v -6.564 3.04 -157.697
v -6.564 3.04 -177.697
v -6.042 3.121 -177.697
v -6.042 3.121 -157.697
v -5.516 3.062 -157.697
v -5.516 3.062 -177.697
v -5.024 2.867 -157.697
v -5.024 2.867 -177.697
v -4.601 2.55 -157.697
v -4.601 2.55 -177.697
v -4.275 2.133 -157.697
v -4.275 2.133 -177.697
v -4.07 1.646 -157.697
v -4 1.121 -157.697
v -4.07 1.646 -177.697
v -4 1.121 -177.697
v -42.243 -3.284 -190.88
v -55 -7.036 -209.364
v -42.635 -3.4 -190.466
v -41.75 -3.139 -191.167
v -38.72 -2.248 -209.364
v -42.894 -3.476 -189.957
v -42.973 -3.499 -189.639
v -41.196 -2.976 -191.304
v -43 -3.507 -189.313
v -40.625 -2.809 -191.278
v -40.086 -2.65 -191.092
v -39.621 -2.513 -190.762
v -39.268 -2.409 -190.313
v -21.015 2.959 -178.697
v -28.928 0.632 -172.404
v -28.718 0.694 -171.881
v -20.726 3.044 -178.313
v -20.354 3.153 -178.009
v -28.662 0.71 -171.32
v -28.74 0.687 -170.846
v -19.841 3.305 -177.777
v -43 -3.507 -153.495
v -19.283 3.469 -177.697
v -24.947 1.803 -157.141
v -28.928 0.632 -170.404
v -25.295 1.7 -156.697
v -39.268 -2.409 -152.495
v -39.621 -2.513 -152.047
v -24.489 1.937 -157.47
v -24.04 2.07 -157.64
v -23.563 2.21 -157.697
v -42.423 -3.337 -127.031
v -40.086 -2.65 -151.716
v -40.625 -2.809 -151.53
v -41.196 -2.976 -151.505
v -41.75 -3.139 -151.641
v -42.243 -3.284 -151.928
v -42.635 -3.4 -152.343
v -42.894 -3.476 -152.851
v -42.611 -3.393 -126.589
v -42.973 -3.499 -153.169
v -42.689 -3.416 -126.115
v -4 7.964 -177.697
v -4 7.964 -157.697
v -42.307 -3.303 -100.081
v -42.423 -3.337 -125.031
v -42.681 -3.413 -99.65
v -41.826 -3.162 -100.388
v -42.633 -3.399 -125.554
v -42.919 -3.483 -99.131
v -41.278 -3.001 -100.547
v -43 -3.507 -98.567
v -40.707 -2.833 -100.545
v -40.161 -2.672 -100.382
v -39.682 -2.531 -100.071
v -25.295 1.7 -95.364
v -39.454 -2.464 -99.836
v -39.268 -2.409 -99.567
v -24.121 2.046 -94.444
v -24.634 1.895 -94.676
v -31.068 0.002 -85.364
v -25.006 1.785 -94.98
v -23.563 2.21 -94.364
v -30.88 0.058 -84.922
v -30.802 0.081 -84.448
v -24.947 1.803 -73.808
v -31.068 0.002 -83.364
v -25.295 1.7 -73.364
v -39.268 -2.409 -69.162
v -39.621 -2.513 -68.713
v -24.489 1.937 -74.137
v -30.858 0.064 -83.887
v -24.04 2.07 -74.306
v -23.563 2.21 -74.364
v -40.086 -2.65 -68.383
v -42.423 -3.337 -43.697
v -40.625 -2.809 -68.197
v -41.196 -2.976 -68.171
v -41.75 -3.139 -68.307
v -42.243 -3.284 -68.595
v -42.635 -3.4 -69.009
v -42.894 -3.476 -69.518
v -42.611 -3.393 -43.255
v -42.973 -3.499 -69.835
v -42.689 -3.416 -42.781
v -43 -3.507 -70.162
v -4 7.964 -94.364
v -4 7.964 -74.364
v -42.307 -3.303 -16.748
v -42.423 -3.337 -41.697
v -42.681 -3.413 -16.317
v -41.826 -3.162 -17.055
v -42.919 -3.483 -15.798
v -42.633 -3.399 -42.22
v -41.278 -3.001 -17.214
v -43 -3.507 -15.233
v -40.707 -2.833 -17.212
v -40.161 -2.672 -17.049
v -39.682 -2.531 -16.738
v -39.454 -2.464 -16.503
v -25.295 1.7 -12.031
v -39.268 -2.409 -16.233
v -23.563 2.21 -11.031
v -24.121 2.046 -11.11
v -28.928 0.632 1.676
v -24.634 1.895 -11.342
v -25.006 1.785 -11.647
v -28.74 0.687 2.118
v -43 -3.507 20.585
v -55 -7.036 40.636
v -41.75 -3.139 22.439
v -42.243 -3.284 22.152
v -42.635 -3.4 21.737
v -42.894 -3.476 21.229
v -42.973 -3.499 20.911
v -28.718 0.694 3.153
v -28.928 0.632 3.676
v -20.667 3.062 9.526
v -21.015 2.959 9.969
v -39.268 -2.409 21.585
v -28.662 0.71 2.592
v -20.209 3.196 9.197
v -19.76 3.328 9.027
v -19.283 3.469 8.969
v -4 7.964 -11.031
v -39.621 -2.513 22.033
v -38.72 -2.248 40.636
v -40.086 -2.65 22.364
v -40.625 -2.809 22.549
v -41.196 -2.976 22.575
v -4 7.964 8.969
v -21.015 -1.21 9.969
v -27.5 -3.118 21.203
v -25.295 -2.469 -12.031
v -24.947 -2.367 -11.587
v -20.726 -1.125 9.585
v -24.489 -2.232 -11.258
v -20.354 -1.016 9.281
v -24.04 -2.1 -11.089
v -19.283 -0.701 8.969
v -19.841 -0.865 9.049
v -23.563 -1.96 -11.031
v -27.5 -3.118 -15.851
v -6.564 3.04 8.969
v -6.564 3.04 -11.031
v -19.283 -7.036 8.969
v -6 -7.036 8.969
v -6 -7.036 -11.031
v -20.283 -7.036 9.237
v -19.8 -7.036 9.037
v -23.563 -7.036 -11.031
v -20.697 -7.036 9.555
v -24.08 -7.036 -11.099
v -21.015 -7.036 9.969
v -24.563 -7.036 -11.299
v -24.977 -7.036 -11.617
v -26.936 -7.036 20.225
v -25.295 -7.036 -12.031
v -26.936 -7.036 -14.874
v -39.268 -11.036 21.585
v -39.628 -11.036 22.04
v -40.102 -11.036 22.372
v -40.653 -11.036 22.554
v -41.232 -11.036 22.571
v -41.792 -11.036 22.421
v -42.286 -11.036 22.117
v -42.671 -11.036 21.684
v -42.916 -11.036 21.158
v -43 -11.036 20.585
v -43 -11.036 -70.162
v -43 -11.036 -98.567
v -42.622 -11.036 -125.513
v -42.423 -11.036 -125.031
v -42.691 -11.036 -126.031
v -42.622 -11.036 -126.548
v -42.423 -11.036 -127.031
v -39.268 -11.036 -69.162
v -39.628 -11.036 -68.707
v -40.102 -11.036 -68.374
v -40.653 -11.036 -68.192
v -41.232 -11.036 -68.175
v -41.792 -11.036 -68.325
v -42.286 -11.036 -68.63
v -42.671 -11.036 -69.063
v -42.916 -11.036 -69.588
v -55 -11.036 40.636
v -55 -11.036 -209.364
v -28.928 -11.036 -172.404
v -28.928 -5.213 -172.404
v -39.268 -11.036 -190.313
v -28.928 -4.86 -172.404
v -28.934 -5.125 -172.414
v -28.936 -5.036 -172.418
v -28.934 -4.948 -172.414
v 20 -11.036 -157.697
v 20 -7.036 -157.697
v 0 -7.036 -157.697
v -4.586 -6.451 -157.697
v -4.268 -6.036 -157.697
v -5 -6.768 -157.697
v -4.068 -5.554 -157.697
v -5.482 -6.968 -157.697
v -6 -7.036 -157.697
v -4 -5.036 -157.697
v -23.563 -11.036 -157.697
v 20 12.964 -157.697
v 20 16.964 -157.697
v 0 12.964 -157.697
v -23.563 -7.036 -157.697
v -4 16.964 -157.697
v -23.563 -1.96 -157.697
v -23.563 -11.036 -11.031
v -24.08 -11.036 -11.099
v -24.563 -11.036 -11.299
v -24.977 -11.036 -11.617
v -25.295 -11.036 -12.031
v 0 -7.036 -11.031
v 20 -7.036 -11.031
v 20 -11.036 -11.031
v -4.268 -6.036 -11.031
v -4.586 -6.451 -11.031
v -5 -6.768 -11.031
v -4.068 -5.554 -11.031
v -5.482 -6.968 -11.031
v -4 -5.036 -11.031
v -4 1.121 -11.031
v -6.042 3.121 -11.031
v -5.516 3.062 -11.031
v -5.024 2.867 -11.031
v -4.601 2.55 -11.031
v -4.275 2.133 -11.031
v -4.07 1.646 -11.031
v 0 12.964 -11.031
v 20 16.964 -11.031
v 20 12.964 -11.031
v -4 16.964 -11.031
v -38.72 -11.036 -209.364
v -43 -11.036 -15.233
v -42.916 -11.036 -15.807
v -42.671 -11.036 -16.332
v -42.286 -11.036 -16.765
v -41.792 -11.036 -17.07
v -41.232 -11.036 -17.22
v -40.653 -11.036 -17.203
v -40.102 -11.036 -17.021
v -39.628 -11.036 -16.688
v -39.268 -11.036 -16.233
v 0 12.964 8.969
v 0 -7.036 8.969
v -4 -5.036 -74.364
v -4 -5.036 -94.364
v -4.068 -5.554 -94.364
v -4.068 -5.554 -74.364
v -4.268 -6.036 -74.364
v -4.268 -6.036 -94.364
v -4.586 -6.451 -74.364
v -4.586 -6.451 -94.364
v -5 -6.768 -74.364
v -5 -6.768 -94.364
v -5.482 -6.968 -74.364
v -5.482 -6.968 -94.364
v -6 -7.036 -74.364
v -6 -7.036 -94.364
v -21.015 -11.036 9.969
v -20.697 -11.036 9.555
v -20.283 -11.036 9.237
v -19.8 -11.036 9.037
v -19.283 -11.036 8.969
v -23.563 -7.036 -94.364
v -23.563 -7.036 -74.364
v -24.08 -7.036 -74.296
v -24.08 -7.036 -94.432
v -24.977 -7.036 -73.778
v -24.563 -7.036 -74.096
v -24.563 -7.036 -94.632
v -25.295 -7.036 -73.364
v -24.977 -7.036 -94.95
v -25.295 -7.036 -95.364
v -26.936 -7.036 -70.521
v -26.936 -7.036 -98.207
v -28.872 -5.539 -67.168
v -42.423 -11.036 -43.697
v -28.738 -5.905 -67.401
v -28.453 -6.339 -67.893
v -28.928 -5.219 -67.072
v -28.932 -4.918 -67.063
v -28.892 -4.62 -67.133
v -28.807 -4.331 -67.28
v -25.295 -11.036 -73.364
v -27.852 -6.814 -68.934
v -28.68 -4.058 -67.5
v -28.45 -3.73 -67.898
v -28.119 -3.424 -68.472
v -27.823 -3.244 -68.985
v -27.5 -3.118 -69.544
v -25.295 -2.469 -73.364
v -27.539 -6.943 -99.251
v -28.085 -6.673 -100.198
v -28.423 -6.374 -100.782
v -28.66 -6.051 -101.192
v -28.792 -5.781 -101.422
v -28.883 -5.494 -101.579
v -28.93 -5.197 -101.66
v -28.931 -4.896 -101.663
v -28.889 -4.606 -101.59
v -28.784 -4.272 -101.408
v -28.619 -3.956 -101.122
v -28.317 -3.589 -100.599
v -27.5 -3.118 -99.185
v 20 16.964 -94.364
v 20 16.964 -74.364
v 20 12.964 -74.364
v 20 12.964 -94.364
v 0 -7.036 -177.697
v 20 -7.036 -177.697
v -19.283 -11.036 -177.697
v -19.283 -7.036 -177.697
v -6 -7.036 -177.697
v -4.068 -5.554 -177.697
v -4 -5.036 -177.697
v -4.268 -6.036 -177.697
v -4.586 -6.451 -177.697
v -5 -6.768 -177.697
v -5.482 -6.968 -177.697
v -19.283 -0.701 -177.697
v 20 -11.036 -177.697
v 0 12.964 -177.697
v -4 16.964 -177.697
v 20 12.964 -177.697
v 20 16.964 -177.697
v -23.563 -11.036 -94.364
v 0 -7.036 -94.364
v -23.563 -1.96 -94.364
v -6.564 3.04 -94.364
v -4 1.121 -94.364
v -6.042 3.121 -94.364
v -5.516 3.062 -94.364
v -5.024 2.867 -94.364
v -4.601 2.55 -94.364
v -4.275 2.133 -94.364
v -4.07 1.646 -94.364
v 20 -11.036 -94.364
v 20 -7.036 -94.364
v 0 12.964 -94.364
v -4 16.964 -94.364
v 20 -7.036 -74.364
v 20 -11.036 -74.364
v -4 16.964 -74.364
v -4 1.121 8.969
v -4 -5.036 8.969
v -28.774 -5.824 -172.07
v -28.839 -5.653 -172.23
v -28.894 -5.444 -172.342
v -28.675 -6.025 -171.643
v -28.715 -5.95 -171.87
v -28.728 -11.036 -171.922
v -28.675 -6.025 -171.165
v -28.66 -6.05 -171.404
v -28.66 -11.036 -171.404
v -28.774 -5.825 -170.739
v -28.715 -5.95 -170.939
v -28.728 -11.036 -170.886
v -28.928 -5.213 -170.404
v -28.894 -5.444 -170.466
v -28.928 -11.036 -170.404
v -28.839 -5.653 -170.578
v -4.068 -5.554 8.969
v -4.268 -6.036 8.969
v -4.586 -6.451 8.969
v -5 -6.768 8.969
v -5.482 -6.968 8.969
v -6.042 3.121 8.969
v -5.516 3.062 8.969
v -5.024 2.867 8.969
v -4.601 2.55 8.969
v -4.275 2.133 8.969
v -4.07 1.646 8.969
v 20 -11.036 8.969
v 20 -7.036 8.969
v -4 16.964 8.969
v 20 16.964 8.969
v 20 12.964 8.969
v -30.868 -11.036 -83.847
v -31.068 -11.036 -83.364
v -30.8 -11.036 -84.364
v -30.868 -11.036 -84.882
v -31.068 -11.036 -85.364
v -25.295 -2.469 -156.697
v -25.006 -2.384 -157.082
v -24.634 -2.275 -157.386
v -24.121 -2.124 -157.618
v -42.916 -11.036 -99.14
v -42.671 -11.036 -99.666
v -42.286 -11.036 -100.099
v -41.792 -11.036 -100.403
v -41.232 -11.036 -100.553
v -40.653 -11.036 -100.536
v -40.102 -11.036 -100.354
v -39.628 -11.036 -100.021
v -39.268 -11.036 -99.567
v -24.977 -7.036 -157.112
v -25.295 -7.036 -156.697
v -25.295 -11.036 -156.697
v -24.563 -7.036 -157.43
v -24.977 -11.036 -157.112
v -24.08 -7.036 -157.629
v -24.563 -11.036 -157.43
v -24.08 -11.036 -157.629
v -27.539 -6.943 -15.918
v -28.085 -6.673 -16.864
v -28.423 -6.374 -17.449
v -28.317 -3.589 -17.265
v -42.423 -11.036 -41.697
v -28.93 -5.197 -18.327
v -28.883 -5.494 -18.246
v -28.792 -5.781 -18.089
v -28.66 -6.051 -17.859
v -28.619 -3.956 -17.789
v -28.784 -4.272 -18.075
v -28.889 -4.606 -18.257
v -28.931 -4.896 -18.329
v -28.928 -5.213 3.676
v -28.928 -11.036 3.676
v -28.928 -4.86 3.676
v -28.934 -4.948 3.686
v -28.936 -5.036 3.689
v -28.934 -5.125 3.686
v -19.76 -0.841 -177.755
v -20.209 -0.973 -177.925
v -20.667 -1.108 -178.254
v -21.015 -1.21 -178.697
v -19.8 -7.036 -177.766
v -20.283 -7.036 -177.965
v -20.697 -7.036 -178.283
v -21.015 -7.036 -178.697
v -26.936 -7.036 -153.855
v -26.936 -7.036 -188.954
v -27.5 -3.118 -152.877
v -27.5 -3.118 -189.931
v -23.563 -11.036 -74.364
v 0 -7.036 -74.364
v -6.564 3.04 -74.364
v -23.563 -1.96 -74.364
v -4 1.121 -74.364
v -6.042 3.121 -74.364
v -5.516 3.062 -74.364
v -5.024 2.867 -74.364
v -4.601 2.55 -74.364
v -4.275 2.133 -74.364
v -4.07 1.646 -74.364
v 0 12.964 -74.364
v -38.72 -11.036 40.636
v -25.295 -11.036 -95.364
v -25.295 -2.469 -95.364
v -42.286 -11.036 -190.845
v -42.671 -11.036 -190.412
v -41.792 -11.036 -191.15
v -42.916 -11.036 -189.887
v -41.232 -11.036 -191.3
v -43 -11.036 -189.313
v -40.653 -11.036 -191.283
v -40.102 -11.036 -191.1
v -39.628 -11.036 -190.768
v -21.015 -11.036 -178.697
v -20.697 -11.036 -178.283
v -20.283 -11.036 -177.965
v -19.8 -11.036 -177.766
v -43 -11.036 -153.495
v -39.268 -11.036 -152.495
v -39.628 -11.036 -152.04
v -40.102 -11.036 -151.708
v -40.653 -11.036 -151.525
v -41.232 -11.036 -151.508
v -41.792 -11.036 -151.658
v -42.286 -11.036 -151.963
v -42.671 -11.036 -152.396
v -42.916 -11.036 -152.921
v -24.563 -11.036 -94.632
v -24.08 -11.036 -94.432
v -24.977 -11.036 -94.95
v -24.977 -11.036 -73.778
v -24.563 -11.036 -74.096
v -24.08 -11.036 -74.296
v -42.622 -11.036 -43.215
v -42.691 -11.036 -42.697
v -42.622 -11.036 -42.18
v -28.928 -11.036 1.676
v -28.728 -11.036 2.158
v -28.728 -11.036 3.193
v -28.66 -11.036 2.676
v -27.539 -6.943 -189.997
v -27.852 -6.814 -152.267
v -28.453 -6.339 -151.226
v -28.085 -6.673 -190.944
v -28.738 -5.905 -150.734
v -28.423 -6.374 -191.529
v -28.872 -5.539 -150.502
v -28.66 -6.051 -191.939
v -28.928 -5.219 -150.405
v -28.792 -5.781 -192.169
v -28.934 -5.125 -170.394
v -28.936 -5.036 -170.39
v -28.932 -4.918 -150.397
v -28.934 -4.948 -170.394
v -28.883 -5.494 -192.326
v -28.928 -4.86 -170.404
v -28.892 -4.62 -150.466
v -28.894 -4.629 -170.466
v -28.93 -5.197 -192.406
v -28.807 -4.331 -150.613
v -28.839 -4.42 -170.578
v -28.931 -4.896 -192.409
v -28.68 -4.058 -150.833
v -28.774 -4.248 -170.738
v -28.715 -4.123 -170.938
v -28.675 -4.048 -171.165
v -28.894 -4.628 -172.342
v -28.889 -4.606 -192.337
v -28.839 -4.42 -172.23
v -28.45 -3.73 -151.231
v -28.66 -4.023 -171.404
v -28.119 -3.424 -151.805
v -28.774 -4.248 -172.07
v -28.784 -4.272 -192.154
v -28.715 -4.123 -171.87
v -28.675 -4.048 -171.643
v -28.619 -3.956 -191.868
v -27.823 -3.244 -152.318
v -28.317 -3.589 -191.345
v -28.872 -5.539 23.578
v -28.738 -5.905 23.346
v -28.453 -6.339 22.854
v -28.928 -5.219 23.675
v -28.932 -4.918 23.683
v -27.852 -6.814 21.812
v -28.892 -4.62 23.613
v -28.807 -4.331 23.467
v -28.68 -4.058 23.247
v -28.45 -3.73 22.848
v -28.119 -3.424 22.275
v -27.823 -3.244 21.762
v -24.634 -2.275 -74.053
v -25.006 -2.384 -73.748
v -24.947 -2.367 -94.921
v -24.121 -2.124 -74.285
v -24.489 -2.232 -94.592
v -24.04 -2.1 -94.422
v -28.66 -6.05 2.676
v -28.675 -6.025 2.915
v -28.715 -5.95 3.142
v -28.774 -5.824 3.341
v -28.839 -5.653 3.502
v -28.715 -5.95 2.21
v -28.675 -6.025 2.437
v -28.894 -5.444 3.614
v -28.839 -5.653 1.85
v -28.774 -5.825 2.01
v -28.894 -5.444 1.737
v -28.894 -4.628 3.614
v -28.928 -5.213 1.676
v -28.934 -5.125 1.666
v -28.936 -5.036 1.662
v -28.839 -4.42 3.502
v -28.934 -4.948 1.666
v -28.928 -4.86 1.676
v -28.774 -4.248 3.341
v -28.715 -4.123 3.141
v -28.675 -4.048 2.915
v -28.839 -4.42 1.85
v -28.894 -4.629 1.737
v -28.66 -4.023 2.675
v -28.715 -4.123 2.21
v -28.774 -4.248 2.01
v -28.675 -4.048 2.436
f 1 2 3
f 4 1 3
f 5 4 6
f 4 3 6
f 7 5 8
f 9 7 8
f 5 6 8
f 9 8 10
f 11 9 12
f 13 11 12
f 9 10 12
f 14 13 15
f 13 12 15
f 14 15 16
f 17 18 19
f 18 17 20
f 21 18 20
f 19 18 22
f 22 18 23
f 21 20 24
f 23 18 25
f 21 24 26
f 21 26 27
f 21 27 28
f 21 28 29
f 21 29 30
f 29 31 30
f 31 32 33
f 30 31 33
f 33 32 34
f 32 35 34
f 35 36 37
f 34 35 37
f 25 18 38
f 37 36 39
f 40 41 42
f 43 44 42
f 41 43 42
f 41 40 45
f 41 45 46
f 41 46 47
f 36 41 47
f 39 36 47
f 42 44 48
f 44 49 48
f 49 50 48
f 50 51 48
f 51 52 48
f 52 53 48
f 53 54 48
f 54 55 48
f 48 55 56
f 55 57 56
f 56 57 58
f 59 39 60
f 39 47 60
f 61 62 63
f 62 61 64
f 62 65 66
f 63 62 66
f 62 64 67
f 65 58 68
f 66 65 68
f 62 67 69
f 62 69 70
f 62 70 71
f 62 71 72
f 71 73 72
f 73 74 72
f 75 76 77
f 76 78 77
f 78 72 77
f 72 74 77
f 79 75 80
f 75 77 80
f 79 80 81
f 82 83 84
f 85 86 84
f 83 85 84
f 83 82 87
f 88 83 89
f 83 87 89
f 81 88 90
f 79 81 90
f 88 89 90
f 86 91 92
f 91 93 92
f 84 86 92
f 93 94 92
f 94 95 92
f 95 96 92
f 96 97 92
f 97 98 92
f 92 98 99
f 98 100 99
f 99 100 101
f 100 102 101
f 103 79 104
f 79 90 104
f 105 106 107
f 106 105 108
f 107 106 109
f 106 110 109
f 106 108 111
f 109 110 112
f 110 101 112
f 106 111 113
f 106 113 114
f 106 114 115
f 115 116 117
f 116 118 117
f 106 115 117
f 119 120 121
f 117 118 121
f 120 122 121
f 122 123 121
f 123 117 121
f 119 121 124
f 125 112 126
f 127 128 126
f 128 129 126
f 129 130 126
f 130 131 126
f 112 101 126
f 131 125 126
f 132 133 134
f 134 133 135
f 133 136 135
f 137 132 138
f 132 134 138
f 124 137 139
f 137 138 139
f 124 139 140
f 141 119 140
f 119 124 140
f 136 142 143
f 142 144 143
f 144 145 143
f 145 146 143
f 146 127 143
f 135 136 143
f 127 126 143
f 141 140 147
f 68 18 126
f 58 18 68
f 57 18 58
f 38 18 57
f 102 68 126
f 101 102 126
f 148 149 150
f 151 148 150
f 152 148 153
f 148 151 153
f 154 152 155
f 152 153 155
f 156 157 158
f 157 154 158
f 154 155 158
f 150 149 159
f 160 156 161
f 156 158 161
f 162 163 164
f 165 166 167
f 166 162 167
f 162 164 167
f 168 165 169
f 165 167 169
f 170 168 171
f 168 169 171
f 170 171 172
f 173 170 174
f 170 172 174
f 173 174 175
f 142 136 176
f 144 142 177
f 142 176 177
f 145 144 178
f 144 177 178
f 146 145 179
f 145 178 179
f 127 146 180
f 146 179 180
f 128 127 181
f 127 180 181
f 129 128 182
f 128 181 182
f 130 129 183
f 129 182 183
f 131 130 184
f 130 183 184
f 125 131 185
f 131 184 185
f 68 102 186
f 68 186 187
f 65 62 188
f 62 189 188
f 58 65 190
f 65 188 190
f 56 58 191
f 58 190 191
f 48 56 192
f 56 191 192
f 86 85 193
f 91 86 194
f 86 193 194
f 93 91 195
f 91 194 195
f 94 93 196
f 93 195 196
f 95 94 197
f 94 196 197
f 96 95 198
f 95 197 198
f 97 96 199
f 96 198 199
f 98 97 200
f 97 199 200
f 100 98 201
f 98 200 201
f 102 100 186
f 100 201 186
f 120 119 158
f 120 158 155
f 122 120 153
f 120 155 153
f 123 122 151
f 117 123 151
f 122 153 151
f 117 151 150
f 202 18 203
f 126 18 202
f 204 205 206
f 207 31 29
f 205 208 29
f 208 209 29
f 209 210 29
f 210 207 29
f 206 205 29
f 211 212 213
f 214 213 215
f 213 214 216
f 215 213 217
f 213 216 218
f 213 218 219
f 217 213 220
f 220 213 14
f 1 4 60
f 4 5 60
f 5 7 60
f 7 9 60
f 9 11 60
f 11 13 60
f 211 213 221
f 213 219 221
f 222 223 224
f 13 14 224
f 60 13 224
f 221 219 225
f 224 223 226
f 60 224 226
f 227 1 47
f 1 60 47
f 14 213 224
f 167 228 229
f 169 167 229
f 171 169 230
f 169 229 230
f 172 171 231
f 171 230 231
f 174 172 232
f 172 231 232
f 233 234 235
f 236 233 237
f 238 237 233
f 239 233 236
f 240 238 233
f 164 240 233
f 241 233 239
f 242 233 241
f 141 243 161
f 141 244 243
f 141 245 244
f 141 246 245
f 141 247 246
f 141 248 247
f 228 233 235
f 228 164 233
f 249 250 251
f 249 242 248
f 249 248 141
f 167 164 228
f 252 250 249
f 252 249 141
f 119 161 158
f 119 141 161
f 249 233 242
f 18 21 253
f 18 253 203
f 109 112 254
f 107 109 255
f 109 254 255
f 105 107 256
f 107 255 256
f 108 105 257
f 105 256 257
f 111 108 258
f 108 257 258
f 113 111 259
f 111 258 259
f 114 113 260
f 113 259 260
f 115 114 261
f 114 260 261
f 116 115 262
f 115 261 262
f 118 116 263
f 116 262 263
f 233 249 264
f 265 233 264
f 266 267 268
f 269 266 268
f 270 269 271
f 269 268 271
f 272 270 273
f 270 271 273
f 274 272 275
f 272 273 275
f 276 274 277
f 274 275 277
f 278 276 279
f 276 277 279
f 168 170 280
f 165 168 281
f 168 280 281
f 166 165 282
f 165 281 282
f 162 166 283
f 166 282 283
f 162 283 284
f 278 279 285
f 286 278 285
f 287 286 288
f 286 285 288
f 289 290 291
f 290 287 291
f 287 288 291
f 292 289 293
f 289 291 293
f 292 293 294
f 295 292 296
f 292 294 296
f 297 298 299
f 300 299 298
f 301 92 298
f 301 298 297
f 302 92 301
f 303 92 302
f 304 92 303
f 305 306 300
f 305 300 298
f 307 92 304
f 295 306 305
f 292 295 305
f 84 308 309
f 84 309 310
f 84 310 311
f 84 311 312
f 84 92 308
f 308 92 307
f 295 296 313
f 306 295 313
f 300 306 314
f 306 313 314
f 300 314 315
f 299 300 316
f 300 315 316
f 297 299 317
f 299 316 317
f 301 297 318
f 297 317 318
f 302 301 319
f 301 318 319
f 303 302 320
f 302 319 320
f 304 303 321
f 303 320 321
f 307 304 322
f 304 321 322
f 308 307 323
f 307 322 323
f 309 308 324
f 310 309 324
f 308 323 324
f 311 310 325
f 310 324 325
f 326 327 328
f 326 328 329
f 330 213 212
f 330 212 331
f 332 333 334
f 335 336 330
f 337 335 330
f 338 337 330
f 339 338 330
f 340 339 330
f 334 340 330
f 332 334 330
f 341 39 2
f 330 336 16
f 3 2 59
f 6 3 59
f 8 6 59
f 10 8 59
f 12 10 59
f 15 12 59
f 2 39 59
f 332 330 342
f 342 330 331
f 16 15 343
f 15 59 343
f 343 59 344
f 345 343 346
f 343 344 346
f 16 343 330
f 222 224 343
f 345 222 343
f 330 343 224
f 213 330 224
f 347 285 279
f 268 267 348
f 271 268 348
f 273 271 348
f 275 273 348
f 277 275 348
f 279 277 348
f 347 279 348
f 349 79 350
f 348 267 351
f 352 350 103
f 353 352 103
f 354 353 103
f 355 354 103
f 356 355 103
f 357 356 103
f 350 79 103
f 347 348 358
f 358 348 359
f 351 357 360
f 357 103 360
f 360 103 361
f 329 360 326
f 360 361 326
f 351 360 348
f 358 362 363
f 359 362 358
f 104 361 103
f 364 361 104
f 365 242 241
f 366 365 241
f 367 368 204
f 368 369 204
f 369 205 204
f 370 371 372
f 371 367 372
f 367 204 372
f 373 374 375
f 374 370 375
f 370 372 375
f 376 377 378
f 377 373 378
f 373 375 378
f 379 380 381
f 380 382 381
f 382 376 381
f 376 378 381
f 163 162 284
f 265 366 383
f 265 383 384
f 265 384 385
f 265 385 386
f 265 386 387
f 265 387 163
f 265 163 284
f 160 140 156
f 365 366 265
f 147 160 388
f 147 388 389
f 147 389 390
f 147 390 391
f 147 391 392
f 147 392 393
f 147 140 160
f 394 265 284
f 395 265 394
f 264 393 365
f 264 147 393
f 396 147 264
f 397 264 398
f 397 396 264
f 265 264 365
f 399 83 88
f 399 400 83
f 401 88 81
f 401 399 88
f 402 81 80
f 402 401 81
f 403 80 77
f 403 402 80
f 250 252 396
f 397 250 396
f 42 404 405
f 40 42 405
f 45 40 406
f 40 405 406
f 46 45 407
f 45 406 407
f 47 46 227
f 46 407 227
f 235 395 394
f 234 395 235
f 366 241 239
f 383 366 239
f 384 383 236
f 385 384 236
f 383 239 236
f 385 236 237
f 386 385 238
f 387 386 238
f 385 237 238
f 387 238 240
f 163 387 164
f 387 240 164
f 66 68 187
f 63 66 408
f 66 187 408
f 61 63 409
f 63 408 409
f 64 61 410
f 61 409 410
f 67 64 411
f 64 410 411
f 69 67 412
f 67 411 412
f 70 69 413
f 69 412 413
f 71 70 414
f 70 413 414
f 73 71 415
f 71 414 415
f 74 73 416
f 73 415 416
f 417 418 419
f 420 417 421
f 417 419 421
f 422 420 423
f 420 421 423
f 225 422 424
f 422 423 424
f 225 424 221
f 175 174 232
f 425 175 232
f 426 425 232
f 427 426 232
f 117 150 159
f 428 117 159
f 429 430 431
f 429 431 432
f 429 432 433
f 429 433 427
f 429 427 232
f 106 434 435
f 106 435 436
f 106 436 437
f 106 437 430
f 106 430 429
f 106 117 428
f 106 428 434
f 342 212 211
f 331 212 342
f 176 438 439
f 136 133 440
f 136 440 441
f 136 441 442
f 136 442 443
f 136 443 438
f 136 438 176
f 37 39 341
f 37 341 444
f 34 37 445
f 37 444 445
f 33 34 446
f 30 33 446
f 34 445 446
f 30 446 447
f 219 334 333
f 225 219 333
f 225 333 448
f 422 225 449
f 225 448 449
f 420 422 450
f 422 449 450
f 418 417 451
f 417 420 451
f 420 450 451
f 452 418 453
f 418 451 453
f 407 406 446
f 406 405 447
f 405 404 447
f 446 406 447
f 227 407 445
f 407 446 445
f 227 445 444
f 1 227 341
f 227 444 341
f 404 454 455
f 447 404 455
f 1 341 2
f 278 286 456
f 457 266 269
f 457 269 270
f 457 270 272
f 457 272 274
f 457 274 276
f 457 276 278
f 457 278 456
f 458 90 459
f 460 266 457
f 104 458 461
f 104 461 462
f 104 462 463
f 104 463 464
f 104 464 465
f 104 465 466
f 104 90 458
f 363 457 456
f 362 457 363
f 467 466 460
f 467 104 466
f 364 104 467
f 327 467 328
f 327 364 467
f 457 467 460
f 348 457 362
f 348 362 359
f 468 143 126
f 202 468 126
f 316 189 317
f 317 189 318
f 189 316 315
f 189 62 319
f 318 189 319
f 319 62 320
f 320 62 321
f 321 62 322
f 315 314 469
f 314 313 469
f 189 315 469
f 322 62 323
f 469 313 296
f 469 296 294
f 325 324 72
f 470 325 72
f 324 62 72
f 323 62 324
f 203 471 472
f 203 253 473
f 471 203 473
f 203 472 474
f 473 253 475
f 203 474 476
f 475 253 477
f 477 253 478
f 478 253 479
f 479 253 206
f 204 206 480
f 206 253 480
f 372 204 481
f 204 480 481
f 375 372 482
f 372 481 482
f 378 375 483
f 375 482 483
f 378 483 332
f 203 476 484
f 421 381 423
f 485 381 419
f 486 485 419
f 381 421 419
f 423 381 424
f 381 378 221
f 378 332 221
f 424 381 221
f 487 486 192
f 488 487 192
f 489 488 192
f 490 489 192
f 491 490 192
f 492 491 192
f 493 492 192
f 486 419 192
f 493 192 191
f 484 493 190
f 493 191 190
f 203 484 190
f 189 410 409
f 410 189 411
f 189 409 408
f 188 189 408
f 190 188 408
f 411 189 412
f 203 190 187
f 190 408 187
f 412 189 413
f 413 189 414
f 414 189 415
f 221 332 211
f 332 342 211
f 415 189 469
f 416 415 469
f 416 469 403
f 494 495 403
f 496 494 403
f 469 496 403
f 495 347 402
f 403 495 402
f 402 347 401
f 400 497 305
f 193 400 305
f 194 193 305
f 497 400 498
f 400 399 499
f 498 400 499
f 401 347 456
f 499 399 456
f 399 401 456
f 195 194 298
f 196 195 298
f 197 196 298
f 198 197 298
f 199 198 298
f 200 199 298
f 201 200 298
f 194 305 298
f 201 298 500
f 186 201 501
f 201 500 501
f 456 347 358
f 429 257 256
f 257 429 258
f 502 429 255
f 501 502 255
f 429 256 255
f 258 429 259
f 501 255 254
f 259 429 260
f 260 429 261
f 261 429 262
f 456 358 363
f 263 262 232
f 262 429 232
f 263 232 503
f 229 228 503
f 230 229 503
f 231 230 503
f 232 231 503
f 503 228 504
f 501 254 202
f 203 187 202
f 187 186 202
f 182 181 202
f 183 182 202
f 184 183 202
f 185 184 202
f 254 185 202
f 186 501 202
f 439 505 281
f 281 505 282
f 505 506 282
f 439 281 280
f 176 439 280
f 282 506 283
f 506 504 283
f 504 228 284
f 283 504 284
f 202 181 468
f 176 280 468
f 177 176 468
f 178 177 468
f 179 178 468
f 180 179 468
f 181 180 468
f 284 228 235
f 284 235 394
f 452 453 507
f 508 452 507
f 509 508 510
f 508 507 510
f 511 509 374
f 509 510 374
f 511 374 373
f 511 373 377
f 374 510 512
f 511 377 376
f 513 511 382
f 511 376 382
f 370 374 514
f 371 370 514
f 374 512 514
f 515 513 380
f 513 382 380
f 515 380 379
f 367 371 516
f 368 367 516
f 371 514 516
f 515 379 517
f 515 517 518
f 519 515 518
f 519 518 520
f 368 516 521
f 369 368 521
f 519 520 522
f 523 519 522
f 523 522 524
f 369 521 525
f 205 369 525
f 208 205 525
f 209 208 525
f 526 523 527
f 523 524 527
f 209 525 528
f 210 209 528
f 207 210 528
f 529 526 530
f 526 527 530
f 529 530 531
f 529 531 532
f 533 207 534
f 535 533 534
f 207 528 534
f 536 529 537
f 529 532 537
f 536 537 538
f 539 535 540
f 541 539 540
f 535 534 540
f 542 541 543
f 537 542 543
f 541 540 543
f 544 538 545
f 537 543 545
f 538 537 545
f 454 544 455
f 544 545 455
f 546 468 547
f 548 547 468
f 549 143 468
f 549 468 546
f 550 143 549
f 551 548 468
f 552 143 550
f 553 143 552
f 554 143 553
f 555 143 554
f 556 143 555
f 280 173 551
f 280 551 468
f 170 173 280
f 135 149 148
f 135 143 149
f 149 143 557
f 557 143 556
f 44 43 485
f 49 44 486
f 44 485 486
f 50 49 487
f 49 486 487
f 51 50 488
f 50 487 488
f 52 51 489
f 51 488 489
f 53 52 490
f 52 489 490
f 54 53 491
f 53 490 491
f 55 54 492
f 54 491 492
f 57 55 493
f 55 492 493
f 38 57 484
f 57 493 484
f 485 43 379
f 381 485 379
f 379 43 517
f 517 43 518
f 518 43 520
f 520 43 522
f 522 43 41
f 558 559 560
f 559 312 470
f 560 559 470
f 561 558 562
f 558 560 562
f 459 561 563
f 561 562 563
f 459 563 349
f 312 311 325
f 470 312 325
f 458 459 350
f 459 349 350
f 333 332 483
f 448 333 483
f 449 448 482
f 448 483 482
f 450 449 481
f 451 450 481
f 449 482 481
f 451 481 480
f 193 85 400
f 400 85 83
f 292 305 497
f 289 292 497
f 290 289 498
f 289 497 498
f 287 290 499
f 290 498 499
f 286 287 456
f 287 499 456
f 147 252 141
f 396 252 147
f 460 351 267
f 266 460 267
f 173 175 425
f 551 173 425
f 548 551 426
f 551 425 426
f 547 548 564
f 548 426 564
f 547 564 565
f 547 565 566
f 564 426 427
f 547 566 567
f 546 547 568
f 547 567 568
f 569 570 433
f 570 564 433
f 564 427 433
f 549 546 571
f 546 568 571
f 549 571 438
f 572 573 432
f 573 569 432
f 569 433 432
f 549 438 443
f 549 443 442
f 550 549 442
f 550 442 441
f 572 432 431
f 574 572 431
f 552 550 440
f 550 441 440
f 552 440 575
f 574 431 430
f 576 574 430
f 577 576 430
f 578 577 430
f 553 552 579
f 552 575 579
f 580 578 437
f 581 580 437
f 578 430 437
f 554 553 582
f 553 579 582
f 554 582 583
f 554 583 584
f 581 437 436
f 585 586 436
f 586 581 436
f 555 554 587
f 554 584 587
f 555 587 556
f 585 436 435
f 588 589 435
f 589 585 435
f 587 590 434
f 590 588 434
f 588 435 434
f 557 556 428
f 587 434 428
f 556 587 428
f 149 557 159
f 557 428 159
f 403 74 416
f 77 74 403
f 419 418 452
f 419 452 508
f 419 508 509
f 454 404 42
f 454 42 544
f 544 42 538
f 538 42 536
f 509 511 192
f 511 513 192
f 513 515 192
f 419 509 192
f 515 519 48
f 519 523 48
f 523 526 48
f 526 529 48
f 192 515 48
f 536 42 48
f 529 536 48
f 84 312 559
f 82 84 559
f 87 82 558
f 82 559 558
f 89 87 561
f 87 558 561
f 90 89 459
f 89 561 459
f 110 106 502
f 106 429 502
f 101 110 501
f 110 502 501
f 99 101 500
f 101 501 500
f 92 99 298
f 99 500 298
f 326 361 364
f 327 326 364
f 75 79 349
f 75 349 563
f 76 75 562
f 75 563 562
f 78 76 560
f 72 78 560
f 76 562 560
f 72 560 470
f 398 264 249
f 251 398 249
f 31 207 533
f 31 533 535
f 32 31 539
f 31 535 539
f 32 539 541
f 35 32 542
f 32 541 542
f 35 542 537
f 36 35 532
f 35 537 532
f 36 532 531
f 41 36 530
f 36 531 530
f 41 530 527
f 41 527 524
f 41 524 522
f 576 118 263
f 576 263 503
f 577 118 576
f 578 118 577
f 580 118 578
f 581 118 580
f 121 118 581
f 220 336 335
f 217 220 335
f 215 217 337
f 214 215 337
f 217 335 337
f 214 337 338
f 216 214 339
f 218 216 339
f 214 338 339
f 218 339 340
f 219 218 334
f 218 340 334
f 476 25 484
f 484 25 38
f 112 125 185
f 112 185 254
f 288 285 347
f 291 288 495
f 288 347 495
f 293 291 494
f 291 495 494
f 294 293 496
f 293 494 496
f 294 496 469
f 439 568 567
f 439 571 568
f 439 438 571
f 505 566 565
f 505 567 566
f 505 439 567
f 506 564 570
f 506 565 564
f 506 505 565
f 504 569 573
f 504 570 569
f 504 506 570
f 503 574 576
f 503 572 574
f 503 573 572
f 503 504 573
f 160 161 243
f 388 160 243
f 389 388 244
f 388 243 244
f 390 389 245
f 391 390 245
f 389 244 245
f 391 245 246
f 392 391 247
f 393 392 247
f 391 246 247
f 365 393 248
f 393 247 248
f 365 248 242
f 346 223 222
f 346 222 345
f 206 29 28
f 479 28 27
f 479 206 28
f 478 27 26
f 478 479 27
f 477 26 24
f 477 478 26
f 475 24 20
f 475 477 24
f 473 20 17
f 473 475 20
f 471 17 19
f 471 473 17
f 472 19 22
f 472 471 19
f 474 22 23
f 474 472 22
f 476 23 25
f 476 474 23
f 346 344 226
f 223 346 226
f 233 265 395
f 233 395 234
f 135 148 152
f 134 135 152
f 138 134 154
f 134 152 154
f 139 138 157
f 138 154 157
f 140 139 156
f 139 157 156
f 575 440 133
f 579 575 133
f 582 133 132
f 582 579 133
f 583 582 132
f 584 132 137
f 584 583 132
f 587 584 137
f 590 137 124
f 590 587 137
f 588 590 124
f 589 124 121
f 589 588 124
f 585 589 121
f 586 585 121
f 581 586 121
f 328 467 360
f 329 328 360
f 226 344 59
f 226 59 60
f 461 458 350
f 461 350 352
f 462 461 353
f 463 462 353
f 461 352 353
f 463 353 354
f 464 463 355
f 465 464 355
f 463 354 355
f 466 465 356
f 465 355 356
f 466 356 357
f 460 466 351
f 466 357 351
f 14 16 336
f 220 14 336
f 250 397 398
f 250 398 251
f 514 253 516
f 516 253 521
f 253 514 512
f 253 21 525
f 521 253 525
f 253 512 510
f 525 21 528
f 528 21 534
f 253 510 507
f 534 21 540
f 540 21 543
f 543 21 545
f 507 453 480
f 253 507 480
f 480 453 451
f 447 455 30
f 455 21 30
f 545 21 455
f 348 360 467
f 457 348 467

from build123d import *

# Parameters (mm, degrees)
SKETCH_1_W          = 250
SKETCH_1_H          = 4
EXTRUDE_1_DEPTH     = 20
EXTRUDE_1_2_DEPTH   = 20
SKETCH_2_W          = 250
SKETCH_2_H          = 28
EXTRUDE_2_DEPTH     = 4
SKETCH_3_W          = 250
SKETCH_3_H          = 4
EXTRUDE_3_DEPTH     = 51
EXTRUDE_4_DEPTH     = 250
CUT_EXTRUDE_1_DEPTH = 55
FILLET_1_R          = 2
CUT_EXTRUDE_2_DEPTH = 250


with BuildPart() as part:
    # 草图1 → 凸台-拉伸1 (new body)
    with BuildSketch(Plane(origin=(0, 0, 0), x_dir=(0, 0, -1), z_dir=(1, 0, 0))):
        with Locations((84.36416185, 14.963552055)):
            Rectangle(SKETCH_1_W, SKETCH_1_H)
    extrude(amount=EXTRUDE_1_DEPTH)



with BuildPart() as body_2:
    # 草图1 → Extrude 1 2 (new body)
    with BuildSketch(Plane(origin=(0, 0, 0), x_dir=(0, 0, -1), z_dir=(1, 0, 0))):
        with Locations((84.36416185, -9.036447945)):
            Rectangle(SKETCH_1_W, SKETCH_1_H)
    extrude(amount=EXTRUDE_1_2_DEPTH)


with BuildPart() as part_1:
    add(part.part)

    add(body_2.part)  # 凸台-拉伸2 merges body 2
    # 草图2 → 凸台-拉伸2 (add)
    with BuildSketch(Plane.ZY):
        with Locations((-84.36416185, 2.963552055)):
            Rectangle(SKETCH_2_W, SKETCH_2_H)
    extrude(amount=EXTRUDE_2_DEPTH)

    # 草图3 → 凸台-拉伸3 (add)
    with BuildSketch(Plane.ZY.offset(4)):
        with Locations((-84.36416185, -9.036447945)):
            Rectangle(SKETCH_3_W, SKETCH_3_H)
    extrude(amount=EXTRUDE_3_DEPTH)

    # 草图5 → 凸台-拉伸4 (add)
    with BuildSketch(Plane.XY.offset(40.63583815)):
        Polygon((-4, -7.036447945), (-55, -7.036447945), (-4, 7.963552055), align=None)
    extrude(amount=-EXTRUDE_4_DEPTH)

    # 草图7 → 切除-拉伸1 (cut)
    with BuildSketch(Plane(origin=(0, 16.963552055, 0), x_dir=(1, 0, 0), z_dir=(0, 1, 0))):
        Polygon((-38.720043801, 209.36416185), (-20.437285277, 177.697495183), (20, 177.697495183), (20, 209.36416185), align=None)
        Polygon((20, 157.697495183), (-24.717241476, 157.697495183), (-43, 126.030828516), (-24.717241476, 94.36416185), (20, 94.36416185), align=None)
        Polygon((-43, 196.77726344), (-43, 146.030828516), (-28.350766068, 171.404045978), align=None)
        Polygon((-43, 106.030828516), (-30.490744168, 84.36416185), (-43, 84.36416185), align=None)
    cut_extrude_1 = extrude(amount=-CUT_EXTRUDE_1_DEPTH, mode=Mode.SUBTRACT)

    # 镜向1: 切除-拉伸1 across plane
    add(cut_extrude_1.mirror(Plane(origin=(0, 0, -84.36416185), x_dir=(1, 0, 0), z_dir=(0, 0, -1))), mode=Mode.SUBTRACT)

    # 圆角1
    fillet_1_edges = [part_1.edges().sort_by_distance(p)[0] for p in [
        (-24.717241476, -4.583101103, -94.36416185),
        (-43, -7.271742062, -126.030828516),
        (-24.717241476, -4.583101103, -157.697495183),
        (-43, -7.271742062, -106.030828516),
        (-30.490744168, -5.432145617, -84.36416185),
        (-20.437285277, -3.95369578, -177.697495183),
        (-28.350766068, -5.117442955, 2.675722279),
        (-43, -7.271742062, 28.048939741),
        (-43, -7.271742062, -22.697495183),
        (-24.717241476, -4.583101103, -11.030828516),
        (-43, -7.271742062, -42.697495183),
        (-24.717241476, -4.583101103, -74.36416185),
        (-43, -7.271742062, -62.697495183),
        (-20.437285277, -3.95369578, 8.969171484),
        (-43, -7.271742062, -196.77726344),
        (-28.350766068, -5.117442955, -171.404045978),
        (-43, -7.271742062, -146.030828516),
    ]]
    fillet(fillet_1_edges, radius=FILLET_1_R)

    # 草图8 → 切除-拉伸2 (cut)
    with BuildSketch(Plane(origin=(0, 0, -209.36416185), x_dir=(-1, 0, 0), z_dir=(0, 0, -1))):
        with BuildLine():
            Line((4, 1.12118318), (4, -5.036447945))
            ThreePointArc((4, -5.036447945), (4.585786438, -6.450661507), (6, -7.036447945))
            Line((6, -7.036447945), (26.935945824, -7.036447945))
            ThreePointArc((26.935945824, -7.036447945), (28.915524315, -5.321525122), (27.500278472, -3.117716942))
            Line((27.500278472, -3.117716942), (6.564332648, 3.039914183))
            ThreePointArc((6.564332648, 3.039914183), (4.80180663, 2.72253656), (4, 1.12118318))
        make_face()
    extrude(amount=-CUT_EXTRUDE_2_DEPTH, mode=Mode.SUBTRACT)


solid = part_1.part
